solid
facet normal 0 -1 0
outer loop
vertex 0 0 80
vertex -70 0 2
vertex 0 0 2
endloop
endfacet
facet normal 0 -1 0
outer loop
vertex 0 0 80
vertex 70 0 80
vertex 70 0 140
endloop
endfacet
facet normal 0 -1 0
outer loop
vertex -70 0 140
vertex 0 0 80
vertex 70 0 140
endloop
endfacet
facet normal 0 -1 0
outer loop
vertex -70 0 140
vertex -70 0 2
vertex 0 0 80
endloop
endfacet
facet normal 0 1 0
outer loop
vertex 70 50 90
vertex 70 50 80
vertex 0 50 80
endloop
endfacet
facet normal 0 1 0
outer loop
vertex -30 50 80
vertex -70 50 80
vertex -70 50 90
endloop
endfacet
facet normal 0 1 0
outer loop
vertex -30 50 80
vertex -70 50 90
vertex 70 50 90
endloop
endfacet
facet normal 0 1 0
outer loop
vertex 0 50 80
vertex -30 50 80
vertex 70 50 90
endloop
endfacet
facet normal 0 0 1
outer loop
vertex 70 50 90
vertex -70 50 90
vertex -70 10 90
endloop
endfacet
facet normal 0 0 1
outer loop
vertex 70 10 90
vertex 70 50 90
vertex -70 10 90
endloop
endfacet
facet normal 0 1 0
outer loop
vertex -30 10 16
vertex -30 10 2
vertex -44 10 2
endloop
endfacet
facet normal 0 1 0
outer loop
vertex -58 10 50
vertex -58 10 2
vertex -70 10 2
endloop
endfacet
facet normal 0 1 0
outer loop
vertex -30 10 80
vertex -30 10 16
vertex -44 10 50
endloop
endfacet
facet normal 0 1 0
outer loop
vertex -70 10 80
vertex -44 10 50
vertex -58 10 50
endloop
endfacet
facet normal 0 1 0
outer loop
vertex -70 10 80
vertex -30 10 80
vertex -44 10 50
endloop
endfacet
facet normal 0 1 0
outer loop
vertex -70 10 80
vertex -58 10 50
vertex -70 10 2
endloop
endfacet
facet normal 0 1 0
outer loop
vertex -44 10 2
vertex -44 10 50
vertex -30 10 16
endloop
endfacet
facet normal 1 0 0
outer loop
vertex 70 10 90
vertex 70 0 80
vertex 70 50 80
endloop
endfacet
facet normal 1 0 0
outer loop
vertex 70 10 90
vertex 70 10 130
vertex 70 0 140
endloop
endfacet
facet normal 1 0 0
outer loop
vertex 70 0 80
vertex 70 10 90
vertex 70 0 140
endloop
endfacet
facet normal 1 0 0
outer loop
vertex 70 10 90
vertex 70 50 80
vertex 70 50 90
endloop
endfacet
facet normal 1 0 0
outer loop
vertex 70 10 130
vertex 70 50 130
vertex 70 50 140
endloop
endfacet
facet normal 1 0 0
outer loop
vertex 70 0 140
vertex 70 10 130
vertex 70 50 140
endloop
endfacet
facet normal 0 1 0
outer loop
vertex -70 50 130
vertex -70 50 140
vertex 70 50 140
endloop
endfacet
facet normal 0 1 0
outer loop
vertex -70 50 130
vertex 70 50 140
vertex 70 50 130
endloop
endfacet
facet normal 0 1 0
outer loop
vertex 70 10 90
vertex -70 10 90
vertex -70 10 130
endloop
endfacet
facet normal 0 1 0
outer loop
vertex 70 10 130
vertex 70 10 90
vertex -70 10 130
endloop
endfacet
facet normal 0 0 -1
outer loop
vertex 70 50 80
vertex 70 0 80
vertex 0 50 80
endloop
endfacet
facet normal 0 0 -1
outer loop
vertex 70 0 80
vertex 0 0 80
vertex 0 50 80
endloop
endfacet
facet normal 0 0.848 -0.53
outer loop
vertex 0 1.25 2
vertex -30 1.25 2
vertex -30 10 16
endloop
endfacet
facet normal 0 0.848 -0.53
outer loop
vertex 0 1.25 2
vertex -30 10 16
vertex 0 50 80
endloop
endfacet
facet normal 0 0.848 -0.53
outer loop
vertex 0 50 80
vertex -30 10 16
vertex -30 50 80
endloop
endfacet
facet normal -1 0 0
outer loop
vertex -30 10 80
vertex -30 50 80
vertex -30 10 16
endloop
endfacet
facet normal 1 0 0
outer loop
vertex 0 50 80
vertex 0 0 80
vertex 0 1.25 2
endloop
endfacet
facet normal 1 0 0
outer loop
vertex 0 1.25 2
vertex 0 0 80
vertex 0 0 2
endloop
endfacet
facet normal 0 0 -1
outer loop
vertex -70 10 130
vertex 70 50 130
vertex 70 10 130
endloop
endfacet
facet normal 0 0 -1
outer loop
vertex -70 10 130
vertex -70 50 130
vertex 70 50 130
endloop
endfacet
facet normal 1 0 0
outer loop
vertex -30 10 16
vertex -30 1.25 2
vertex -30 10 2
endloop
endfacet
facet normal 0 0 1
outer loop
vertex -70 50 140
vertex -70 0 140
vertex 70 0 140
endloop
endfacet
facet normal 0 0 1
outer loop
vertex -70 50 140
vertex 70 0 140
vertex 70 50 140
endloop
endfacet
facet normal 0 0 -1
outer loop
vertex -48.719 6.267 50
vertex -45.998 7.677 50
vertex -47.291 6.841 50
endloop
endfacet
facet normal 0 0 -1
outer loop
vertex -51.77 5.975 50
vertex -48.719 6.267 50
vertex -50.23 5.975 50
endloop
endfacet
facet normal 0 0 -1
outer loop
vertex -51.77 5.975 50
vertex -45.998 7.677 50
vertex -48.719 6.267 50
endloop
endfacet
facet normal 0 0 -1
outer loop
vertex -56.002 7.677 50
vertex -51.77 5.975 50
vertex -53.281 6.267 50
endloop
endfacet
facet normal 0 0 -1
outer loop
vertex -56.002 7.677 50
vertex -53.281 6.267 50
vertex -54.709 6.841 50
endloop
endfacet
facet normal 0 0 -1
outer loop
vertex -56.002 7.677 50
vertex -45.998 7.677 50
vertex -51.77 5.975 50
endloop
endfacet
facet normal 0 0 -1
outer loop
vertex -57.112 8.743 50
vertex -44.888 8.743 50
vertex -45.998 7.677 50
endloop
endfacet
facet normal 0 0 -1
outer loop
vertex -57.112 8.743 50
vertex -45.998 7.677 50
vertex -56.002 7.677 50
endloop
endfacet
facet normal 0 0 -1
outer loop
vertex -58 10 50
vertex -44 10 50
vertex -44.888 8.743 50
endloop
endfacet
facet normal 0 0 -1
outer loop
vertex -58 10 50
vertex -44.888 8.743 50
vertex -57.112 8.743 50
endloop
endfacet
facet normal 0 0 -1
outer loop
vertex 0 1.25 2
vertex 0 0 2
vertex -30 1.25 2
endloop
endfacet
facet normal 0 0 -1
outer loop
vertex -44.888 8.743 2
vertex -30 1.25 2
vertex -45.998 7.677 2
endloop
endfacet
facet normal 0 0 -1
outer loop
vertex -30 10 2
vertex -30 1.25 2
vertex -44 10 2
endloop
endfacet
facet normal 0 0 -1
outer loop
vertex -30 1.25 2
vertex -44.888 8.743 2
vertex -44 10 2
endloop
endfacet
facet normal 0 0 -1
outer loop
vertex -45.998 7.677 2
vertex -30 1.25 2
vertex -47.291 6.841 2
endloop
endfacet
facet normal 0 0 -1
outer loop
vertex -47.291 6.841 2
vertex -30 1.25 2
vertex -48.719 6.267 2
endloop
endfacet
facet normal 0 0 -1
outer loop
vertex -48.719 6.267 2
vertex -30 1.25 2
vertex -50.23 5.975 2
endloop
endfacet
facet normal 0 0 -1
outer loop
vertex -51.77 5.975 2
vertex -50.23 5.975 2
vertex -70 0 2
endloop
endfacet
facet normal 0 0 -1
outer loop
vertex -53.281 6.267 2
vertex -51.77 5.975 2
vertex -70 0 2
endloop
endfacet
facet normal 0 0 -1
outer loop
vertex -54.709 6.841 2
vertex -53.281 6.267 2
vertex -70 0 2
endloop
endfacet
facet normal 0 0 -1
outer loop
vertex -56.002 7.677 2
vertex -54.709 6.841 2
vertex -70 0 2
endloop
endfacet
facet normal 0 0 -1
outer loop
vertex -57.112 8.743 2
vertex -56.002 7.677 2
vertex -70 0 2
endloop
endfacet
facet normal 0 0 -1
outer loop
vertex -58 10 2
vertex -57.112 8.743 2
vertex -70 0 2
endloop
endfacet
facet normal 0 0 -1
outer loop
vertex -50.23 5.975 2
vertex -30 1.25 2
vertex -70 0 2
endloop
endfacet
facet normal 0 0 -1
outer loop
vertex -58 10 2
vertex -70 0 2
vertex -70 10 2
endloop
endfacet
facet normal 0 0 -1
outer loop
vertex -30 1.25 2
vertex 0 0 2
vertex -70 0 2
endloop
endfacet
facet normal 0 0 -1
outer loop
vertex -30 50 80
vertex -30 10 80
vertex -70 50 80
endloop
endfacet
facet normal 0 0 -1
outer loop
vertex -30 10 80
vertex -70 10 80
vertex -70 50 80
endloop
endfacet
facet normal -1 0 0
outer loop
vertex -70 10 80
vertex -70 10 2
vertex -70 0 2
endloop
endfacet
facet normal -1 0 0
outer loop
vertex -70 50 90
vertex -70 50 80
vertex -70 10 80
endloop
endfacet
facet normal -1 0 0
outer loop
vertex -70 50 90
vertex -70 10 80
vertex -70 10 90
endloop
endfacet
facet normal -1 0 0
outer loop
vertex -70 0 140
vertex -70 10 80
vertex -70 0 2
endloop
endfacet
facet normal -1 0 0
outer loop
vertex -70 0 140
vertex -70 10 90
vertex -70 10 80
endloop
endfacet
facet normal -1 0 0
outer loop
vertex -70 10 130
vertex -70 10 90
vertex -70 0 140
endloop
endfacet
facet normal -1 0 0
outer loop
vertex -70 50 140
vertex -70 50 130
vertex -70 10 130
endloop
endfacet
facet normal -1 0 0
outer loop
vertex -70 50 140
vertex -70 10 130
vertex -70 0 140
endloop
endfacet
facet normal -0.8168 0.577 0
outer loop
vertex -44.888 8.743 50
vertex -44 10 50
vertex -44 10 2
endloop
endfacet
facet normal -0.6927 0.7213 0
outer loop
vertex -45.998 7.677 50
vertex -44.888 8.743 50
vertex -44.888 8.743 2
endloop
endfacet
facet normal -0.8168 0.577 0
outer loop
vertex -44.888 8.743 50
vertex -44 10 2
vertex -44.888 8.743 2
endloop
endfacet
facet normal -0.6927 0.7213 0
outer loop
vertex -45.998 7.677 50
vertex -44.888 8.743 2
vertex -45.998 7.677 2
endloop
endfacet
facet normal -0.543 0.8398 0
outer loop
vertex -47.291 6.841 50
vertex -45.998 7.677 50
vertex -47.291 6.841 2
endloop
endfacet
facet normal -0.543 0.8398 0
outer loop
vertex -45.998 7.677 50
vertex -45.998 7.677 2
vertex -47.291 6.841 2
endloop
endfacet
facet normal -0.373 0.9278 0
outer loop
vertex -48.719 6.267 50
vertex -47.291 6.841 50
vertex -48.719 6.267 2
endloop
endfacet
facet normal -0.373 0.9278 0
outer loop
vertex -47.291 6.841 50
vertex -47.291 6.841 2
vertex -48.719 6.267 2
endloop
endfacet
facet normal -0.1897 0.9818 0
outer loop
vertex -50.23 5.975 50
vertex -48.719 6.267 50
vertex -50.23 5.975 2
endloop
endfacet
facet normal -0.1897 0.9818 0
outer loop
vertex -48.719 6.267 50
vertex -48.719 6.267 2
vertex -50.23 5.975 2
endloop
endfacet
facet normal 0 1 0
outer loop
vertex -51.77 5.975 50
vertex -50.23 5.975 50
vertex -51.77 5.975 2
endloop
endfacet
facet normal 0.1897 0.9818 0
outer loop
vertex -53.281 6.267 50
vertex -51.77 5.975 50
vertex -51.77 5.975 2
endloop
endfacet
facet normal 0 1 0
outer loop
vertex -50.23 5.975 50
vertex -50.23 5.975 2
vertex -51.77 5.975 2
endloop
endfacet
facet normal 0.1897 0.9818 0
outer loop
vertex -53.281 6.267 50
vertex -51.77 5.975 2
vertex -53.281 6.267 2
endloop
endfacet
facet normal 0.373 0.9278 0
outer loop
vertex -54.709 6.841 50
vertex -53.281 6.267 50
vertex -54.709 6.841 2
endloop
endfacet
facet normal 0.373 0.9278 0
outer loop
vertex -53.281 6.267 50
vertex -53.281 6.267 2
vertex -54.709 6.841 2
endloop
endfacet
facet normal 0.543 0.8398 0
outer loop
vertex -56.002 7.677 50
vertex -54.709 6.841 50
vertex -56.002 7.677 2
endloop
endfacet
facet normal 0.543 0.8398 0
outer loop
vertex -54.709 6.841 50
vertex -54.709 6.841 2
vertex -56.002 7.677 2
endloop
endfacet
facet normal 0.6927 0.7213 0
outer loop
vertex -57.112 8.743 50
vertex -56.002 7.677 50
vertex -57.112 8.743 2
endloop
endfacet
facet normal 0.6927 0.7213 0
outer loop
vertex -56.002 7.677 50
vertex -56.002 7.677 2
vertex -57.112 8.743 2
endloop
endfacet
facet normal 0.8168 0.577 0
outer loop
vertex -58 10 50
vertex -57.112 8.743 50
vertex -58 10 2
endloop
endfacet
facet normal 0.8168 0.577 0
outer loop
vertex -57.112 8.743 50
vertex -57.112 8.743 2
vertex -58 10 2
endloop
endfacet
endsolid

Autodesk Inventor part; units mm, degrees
ref_plane "YZ Plane" through (0, 0, 0) normal (1, 0, 0) x (0, 1, 0)
ref_plane "XZ Plane" through (0, 0, 0) normal (0, 1, 0) x (-1, 0, 0)
ref_plane "XY Plane" through (0, 0, 0) normal (0, 0, 1) x (1, 0, 0)
sketch "Sketch1" plane through (0, 0, 0) normal (0, 1, 0) x (-1, 0, 0)
  line L0 (70, 80) -> (0, 80)
  line L1 (0, 80) -> (0, 0)
  line L2 (0, 0) -> (70, 0)
  line L3 (70, 0) -> (70, 80)
  line L4 (0, 0) -> (30, 0)
  line L5 (30, 0) -> (30, 60)
  line L6 (30, 60) -> (0, 60)
  line L7 (0, 60) -> (0, 0)
  point P0 (0, 60)
  dimension "d0" = 80
  dimension "d1" = 70
  dimension "d2" = 30
  dimension "d3" = 60
extrude "Extrusion1" add sketch "Sketch1" along normal blind 10 contours L3 L2 L5 L6 L1 L0
sketch "Sketch2" plane through (0, 0, 80) normal (1, 0, 0) x (0, 0, -1)
  line L0 (0, 0) -> (20, 0) construction
  line L1 (0, 10) -> (20, 10) construction
  line L2 (0, 0) -> (0, 10) construction
  line L3 (-50, 0) -> (0, 0)
  line L4 (0, 0) -> (0, 50)
  line L5 (0, 50) -> (-10, 50)
  line L6 (-10, 50) -> (-10, 10)
  line L7 (-10, 10) -> (-50, 10)
  line L8 (-50, 10) -> (-50, 0)
  point P0 (80, 0)
  dimension "d6" = 50
  dimension "d7" = 50
  dimension "d8" = 40
  dimension "d9" = 40
extrude "Extrusion2" add sketch "Sketch2" along normal mid plane 140
sketch "Sketch4" plane through (-30, 0, 0) normal (0, 0, -1) x (-1, 0, 0)
  circle A0 centre (21, 14) radius 8.0623
  point P0 (-30, 0)
extrude "Extrusion3" cut sketch "Sketch4" against normal blind 50
sketch "Sketch6" plane through (-30, 0, 60) normal (1, 0, 0) x (0, 0, -1)
  line L0 (-20, 50) -> (-20, 10) construction
  line L1 (60, 0) -> (-20, 50)
  line L2 (-20, 50) -> (-20, 0)
  line L3 (-20, 0) -> (60, 0)
extrude "Extrusion4" add sketch "Sketch6" along normal blind 30
sketch "Sketch7" plane through (-70, 0, 0) normal (-1, 0, 0) x (0, 0, 1)
  line L0 (2, 52) -> (-22, 52)
  line L1 (-22, 52) -> (-22, -1)
  line L2 (-22, -1) -> (2, -1)
  line L3 (2, -1) -> (2, 52)
extrude "Extrusion5" cut sketch "Sketch7" against normal blind 1000
sketch "Sketch8" plane through (-70, 0, 2) normal (-1, 0, 0) x (0, 0, 1)
  line L0 (128, 0) -> (138, 0)
  line L1 (138, 0) -> (138, 50)
  line L2 (138, 50) -> (128, 50)
  line L3 (128, 50) -> (128, 0)
  point P0 (-2, 0)
  dimension "d18" = 10
extrude "Extrusion6" add sketch "Sketch8" against normal up to surface (140 mm away)
properties part number "GiroMotorKrepl"
